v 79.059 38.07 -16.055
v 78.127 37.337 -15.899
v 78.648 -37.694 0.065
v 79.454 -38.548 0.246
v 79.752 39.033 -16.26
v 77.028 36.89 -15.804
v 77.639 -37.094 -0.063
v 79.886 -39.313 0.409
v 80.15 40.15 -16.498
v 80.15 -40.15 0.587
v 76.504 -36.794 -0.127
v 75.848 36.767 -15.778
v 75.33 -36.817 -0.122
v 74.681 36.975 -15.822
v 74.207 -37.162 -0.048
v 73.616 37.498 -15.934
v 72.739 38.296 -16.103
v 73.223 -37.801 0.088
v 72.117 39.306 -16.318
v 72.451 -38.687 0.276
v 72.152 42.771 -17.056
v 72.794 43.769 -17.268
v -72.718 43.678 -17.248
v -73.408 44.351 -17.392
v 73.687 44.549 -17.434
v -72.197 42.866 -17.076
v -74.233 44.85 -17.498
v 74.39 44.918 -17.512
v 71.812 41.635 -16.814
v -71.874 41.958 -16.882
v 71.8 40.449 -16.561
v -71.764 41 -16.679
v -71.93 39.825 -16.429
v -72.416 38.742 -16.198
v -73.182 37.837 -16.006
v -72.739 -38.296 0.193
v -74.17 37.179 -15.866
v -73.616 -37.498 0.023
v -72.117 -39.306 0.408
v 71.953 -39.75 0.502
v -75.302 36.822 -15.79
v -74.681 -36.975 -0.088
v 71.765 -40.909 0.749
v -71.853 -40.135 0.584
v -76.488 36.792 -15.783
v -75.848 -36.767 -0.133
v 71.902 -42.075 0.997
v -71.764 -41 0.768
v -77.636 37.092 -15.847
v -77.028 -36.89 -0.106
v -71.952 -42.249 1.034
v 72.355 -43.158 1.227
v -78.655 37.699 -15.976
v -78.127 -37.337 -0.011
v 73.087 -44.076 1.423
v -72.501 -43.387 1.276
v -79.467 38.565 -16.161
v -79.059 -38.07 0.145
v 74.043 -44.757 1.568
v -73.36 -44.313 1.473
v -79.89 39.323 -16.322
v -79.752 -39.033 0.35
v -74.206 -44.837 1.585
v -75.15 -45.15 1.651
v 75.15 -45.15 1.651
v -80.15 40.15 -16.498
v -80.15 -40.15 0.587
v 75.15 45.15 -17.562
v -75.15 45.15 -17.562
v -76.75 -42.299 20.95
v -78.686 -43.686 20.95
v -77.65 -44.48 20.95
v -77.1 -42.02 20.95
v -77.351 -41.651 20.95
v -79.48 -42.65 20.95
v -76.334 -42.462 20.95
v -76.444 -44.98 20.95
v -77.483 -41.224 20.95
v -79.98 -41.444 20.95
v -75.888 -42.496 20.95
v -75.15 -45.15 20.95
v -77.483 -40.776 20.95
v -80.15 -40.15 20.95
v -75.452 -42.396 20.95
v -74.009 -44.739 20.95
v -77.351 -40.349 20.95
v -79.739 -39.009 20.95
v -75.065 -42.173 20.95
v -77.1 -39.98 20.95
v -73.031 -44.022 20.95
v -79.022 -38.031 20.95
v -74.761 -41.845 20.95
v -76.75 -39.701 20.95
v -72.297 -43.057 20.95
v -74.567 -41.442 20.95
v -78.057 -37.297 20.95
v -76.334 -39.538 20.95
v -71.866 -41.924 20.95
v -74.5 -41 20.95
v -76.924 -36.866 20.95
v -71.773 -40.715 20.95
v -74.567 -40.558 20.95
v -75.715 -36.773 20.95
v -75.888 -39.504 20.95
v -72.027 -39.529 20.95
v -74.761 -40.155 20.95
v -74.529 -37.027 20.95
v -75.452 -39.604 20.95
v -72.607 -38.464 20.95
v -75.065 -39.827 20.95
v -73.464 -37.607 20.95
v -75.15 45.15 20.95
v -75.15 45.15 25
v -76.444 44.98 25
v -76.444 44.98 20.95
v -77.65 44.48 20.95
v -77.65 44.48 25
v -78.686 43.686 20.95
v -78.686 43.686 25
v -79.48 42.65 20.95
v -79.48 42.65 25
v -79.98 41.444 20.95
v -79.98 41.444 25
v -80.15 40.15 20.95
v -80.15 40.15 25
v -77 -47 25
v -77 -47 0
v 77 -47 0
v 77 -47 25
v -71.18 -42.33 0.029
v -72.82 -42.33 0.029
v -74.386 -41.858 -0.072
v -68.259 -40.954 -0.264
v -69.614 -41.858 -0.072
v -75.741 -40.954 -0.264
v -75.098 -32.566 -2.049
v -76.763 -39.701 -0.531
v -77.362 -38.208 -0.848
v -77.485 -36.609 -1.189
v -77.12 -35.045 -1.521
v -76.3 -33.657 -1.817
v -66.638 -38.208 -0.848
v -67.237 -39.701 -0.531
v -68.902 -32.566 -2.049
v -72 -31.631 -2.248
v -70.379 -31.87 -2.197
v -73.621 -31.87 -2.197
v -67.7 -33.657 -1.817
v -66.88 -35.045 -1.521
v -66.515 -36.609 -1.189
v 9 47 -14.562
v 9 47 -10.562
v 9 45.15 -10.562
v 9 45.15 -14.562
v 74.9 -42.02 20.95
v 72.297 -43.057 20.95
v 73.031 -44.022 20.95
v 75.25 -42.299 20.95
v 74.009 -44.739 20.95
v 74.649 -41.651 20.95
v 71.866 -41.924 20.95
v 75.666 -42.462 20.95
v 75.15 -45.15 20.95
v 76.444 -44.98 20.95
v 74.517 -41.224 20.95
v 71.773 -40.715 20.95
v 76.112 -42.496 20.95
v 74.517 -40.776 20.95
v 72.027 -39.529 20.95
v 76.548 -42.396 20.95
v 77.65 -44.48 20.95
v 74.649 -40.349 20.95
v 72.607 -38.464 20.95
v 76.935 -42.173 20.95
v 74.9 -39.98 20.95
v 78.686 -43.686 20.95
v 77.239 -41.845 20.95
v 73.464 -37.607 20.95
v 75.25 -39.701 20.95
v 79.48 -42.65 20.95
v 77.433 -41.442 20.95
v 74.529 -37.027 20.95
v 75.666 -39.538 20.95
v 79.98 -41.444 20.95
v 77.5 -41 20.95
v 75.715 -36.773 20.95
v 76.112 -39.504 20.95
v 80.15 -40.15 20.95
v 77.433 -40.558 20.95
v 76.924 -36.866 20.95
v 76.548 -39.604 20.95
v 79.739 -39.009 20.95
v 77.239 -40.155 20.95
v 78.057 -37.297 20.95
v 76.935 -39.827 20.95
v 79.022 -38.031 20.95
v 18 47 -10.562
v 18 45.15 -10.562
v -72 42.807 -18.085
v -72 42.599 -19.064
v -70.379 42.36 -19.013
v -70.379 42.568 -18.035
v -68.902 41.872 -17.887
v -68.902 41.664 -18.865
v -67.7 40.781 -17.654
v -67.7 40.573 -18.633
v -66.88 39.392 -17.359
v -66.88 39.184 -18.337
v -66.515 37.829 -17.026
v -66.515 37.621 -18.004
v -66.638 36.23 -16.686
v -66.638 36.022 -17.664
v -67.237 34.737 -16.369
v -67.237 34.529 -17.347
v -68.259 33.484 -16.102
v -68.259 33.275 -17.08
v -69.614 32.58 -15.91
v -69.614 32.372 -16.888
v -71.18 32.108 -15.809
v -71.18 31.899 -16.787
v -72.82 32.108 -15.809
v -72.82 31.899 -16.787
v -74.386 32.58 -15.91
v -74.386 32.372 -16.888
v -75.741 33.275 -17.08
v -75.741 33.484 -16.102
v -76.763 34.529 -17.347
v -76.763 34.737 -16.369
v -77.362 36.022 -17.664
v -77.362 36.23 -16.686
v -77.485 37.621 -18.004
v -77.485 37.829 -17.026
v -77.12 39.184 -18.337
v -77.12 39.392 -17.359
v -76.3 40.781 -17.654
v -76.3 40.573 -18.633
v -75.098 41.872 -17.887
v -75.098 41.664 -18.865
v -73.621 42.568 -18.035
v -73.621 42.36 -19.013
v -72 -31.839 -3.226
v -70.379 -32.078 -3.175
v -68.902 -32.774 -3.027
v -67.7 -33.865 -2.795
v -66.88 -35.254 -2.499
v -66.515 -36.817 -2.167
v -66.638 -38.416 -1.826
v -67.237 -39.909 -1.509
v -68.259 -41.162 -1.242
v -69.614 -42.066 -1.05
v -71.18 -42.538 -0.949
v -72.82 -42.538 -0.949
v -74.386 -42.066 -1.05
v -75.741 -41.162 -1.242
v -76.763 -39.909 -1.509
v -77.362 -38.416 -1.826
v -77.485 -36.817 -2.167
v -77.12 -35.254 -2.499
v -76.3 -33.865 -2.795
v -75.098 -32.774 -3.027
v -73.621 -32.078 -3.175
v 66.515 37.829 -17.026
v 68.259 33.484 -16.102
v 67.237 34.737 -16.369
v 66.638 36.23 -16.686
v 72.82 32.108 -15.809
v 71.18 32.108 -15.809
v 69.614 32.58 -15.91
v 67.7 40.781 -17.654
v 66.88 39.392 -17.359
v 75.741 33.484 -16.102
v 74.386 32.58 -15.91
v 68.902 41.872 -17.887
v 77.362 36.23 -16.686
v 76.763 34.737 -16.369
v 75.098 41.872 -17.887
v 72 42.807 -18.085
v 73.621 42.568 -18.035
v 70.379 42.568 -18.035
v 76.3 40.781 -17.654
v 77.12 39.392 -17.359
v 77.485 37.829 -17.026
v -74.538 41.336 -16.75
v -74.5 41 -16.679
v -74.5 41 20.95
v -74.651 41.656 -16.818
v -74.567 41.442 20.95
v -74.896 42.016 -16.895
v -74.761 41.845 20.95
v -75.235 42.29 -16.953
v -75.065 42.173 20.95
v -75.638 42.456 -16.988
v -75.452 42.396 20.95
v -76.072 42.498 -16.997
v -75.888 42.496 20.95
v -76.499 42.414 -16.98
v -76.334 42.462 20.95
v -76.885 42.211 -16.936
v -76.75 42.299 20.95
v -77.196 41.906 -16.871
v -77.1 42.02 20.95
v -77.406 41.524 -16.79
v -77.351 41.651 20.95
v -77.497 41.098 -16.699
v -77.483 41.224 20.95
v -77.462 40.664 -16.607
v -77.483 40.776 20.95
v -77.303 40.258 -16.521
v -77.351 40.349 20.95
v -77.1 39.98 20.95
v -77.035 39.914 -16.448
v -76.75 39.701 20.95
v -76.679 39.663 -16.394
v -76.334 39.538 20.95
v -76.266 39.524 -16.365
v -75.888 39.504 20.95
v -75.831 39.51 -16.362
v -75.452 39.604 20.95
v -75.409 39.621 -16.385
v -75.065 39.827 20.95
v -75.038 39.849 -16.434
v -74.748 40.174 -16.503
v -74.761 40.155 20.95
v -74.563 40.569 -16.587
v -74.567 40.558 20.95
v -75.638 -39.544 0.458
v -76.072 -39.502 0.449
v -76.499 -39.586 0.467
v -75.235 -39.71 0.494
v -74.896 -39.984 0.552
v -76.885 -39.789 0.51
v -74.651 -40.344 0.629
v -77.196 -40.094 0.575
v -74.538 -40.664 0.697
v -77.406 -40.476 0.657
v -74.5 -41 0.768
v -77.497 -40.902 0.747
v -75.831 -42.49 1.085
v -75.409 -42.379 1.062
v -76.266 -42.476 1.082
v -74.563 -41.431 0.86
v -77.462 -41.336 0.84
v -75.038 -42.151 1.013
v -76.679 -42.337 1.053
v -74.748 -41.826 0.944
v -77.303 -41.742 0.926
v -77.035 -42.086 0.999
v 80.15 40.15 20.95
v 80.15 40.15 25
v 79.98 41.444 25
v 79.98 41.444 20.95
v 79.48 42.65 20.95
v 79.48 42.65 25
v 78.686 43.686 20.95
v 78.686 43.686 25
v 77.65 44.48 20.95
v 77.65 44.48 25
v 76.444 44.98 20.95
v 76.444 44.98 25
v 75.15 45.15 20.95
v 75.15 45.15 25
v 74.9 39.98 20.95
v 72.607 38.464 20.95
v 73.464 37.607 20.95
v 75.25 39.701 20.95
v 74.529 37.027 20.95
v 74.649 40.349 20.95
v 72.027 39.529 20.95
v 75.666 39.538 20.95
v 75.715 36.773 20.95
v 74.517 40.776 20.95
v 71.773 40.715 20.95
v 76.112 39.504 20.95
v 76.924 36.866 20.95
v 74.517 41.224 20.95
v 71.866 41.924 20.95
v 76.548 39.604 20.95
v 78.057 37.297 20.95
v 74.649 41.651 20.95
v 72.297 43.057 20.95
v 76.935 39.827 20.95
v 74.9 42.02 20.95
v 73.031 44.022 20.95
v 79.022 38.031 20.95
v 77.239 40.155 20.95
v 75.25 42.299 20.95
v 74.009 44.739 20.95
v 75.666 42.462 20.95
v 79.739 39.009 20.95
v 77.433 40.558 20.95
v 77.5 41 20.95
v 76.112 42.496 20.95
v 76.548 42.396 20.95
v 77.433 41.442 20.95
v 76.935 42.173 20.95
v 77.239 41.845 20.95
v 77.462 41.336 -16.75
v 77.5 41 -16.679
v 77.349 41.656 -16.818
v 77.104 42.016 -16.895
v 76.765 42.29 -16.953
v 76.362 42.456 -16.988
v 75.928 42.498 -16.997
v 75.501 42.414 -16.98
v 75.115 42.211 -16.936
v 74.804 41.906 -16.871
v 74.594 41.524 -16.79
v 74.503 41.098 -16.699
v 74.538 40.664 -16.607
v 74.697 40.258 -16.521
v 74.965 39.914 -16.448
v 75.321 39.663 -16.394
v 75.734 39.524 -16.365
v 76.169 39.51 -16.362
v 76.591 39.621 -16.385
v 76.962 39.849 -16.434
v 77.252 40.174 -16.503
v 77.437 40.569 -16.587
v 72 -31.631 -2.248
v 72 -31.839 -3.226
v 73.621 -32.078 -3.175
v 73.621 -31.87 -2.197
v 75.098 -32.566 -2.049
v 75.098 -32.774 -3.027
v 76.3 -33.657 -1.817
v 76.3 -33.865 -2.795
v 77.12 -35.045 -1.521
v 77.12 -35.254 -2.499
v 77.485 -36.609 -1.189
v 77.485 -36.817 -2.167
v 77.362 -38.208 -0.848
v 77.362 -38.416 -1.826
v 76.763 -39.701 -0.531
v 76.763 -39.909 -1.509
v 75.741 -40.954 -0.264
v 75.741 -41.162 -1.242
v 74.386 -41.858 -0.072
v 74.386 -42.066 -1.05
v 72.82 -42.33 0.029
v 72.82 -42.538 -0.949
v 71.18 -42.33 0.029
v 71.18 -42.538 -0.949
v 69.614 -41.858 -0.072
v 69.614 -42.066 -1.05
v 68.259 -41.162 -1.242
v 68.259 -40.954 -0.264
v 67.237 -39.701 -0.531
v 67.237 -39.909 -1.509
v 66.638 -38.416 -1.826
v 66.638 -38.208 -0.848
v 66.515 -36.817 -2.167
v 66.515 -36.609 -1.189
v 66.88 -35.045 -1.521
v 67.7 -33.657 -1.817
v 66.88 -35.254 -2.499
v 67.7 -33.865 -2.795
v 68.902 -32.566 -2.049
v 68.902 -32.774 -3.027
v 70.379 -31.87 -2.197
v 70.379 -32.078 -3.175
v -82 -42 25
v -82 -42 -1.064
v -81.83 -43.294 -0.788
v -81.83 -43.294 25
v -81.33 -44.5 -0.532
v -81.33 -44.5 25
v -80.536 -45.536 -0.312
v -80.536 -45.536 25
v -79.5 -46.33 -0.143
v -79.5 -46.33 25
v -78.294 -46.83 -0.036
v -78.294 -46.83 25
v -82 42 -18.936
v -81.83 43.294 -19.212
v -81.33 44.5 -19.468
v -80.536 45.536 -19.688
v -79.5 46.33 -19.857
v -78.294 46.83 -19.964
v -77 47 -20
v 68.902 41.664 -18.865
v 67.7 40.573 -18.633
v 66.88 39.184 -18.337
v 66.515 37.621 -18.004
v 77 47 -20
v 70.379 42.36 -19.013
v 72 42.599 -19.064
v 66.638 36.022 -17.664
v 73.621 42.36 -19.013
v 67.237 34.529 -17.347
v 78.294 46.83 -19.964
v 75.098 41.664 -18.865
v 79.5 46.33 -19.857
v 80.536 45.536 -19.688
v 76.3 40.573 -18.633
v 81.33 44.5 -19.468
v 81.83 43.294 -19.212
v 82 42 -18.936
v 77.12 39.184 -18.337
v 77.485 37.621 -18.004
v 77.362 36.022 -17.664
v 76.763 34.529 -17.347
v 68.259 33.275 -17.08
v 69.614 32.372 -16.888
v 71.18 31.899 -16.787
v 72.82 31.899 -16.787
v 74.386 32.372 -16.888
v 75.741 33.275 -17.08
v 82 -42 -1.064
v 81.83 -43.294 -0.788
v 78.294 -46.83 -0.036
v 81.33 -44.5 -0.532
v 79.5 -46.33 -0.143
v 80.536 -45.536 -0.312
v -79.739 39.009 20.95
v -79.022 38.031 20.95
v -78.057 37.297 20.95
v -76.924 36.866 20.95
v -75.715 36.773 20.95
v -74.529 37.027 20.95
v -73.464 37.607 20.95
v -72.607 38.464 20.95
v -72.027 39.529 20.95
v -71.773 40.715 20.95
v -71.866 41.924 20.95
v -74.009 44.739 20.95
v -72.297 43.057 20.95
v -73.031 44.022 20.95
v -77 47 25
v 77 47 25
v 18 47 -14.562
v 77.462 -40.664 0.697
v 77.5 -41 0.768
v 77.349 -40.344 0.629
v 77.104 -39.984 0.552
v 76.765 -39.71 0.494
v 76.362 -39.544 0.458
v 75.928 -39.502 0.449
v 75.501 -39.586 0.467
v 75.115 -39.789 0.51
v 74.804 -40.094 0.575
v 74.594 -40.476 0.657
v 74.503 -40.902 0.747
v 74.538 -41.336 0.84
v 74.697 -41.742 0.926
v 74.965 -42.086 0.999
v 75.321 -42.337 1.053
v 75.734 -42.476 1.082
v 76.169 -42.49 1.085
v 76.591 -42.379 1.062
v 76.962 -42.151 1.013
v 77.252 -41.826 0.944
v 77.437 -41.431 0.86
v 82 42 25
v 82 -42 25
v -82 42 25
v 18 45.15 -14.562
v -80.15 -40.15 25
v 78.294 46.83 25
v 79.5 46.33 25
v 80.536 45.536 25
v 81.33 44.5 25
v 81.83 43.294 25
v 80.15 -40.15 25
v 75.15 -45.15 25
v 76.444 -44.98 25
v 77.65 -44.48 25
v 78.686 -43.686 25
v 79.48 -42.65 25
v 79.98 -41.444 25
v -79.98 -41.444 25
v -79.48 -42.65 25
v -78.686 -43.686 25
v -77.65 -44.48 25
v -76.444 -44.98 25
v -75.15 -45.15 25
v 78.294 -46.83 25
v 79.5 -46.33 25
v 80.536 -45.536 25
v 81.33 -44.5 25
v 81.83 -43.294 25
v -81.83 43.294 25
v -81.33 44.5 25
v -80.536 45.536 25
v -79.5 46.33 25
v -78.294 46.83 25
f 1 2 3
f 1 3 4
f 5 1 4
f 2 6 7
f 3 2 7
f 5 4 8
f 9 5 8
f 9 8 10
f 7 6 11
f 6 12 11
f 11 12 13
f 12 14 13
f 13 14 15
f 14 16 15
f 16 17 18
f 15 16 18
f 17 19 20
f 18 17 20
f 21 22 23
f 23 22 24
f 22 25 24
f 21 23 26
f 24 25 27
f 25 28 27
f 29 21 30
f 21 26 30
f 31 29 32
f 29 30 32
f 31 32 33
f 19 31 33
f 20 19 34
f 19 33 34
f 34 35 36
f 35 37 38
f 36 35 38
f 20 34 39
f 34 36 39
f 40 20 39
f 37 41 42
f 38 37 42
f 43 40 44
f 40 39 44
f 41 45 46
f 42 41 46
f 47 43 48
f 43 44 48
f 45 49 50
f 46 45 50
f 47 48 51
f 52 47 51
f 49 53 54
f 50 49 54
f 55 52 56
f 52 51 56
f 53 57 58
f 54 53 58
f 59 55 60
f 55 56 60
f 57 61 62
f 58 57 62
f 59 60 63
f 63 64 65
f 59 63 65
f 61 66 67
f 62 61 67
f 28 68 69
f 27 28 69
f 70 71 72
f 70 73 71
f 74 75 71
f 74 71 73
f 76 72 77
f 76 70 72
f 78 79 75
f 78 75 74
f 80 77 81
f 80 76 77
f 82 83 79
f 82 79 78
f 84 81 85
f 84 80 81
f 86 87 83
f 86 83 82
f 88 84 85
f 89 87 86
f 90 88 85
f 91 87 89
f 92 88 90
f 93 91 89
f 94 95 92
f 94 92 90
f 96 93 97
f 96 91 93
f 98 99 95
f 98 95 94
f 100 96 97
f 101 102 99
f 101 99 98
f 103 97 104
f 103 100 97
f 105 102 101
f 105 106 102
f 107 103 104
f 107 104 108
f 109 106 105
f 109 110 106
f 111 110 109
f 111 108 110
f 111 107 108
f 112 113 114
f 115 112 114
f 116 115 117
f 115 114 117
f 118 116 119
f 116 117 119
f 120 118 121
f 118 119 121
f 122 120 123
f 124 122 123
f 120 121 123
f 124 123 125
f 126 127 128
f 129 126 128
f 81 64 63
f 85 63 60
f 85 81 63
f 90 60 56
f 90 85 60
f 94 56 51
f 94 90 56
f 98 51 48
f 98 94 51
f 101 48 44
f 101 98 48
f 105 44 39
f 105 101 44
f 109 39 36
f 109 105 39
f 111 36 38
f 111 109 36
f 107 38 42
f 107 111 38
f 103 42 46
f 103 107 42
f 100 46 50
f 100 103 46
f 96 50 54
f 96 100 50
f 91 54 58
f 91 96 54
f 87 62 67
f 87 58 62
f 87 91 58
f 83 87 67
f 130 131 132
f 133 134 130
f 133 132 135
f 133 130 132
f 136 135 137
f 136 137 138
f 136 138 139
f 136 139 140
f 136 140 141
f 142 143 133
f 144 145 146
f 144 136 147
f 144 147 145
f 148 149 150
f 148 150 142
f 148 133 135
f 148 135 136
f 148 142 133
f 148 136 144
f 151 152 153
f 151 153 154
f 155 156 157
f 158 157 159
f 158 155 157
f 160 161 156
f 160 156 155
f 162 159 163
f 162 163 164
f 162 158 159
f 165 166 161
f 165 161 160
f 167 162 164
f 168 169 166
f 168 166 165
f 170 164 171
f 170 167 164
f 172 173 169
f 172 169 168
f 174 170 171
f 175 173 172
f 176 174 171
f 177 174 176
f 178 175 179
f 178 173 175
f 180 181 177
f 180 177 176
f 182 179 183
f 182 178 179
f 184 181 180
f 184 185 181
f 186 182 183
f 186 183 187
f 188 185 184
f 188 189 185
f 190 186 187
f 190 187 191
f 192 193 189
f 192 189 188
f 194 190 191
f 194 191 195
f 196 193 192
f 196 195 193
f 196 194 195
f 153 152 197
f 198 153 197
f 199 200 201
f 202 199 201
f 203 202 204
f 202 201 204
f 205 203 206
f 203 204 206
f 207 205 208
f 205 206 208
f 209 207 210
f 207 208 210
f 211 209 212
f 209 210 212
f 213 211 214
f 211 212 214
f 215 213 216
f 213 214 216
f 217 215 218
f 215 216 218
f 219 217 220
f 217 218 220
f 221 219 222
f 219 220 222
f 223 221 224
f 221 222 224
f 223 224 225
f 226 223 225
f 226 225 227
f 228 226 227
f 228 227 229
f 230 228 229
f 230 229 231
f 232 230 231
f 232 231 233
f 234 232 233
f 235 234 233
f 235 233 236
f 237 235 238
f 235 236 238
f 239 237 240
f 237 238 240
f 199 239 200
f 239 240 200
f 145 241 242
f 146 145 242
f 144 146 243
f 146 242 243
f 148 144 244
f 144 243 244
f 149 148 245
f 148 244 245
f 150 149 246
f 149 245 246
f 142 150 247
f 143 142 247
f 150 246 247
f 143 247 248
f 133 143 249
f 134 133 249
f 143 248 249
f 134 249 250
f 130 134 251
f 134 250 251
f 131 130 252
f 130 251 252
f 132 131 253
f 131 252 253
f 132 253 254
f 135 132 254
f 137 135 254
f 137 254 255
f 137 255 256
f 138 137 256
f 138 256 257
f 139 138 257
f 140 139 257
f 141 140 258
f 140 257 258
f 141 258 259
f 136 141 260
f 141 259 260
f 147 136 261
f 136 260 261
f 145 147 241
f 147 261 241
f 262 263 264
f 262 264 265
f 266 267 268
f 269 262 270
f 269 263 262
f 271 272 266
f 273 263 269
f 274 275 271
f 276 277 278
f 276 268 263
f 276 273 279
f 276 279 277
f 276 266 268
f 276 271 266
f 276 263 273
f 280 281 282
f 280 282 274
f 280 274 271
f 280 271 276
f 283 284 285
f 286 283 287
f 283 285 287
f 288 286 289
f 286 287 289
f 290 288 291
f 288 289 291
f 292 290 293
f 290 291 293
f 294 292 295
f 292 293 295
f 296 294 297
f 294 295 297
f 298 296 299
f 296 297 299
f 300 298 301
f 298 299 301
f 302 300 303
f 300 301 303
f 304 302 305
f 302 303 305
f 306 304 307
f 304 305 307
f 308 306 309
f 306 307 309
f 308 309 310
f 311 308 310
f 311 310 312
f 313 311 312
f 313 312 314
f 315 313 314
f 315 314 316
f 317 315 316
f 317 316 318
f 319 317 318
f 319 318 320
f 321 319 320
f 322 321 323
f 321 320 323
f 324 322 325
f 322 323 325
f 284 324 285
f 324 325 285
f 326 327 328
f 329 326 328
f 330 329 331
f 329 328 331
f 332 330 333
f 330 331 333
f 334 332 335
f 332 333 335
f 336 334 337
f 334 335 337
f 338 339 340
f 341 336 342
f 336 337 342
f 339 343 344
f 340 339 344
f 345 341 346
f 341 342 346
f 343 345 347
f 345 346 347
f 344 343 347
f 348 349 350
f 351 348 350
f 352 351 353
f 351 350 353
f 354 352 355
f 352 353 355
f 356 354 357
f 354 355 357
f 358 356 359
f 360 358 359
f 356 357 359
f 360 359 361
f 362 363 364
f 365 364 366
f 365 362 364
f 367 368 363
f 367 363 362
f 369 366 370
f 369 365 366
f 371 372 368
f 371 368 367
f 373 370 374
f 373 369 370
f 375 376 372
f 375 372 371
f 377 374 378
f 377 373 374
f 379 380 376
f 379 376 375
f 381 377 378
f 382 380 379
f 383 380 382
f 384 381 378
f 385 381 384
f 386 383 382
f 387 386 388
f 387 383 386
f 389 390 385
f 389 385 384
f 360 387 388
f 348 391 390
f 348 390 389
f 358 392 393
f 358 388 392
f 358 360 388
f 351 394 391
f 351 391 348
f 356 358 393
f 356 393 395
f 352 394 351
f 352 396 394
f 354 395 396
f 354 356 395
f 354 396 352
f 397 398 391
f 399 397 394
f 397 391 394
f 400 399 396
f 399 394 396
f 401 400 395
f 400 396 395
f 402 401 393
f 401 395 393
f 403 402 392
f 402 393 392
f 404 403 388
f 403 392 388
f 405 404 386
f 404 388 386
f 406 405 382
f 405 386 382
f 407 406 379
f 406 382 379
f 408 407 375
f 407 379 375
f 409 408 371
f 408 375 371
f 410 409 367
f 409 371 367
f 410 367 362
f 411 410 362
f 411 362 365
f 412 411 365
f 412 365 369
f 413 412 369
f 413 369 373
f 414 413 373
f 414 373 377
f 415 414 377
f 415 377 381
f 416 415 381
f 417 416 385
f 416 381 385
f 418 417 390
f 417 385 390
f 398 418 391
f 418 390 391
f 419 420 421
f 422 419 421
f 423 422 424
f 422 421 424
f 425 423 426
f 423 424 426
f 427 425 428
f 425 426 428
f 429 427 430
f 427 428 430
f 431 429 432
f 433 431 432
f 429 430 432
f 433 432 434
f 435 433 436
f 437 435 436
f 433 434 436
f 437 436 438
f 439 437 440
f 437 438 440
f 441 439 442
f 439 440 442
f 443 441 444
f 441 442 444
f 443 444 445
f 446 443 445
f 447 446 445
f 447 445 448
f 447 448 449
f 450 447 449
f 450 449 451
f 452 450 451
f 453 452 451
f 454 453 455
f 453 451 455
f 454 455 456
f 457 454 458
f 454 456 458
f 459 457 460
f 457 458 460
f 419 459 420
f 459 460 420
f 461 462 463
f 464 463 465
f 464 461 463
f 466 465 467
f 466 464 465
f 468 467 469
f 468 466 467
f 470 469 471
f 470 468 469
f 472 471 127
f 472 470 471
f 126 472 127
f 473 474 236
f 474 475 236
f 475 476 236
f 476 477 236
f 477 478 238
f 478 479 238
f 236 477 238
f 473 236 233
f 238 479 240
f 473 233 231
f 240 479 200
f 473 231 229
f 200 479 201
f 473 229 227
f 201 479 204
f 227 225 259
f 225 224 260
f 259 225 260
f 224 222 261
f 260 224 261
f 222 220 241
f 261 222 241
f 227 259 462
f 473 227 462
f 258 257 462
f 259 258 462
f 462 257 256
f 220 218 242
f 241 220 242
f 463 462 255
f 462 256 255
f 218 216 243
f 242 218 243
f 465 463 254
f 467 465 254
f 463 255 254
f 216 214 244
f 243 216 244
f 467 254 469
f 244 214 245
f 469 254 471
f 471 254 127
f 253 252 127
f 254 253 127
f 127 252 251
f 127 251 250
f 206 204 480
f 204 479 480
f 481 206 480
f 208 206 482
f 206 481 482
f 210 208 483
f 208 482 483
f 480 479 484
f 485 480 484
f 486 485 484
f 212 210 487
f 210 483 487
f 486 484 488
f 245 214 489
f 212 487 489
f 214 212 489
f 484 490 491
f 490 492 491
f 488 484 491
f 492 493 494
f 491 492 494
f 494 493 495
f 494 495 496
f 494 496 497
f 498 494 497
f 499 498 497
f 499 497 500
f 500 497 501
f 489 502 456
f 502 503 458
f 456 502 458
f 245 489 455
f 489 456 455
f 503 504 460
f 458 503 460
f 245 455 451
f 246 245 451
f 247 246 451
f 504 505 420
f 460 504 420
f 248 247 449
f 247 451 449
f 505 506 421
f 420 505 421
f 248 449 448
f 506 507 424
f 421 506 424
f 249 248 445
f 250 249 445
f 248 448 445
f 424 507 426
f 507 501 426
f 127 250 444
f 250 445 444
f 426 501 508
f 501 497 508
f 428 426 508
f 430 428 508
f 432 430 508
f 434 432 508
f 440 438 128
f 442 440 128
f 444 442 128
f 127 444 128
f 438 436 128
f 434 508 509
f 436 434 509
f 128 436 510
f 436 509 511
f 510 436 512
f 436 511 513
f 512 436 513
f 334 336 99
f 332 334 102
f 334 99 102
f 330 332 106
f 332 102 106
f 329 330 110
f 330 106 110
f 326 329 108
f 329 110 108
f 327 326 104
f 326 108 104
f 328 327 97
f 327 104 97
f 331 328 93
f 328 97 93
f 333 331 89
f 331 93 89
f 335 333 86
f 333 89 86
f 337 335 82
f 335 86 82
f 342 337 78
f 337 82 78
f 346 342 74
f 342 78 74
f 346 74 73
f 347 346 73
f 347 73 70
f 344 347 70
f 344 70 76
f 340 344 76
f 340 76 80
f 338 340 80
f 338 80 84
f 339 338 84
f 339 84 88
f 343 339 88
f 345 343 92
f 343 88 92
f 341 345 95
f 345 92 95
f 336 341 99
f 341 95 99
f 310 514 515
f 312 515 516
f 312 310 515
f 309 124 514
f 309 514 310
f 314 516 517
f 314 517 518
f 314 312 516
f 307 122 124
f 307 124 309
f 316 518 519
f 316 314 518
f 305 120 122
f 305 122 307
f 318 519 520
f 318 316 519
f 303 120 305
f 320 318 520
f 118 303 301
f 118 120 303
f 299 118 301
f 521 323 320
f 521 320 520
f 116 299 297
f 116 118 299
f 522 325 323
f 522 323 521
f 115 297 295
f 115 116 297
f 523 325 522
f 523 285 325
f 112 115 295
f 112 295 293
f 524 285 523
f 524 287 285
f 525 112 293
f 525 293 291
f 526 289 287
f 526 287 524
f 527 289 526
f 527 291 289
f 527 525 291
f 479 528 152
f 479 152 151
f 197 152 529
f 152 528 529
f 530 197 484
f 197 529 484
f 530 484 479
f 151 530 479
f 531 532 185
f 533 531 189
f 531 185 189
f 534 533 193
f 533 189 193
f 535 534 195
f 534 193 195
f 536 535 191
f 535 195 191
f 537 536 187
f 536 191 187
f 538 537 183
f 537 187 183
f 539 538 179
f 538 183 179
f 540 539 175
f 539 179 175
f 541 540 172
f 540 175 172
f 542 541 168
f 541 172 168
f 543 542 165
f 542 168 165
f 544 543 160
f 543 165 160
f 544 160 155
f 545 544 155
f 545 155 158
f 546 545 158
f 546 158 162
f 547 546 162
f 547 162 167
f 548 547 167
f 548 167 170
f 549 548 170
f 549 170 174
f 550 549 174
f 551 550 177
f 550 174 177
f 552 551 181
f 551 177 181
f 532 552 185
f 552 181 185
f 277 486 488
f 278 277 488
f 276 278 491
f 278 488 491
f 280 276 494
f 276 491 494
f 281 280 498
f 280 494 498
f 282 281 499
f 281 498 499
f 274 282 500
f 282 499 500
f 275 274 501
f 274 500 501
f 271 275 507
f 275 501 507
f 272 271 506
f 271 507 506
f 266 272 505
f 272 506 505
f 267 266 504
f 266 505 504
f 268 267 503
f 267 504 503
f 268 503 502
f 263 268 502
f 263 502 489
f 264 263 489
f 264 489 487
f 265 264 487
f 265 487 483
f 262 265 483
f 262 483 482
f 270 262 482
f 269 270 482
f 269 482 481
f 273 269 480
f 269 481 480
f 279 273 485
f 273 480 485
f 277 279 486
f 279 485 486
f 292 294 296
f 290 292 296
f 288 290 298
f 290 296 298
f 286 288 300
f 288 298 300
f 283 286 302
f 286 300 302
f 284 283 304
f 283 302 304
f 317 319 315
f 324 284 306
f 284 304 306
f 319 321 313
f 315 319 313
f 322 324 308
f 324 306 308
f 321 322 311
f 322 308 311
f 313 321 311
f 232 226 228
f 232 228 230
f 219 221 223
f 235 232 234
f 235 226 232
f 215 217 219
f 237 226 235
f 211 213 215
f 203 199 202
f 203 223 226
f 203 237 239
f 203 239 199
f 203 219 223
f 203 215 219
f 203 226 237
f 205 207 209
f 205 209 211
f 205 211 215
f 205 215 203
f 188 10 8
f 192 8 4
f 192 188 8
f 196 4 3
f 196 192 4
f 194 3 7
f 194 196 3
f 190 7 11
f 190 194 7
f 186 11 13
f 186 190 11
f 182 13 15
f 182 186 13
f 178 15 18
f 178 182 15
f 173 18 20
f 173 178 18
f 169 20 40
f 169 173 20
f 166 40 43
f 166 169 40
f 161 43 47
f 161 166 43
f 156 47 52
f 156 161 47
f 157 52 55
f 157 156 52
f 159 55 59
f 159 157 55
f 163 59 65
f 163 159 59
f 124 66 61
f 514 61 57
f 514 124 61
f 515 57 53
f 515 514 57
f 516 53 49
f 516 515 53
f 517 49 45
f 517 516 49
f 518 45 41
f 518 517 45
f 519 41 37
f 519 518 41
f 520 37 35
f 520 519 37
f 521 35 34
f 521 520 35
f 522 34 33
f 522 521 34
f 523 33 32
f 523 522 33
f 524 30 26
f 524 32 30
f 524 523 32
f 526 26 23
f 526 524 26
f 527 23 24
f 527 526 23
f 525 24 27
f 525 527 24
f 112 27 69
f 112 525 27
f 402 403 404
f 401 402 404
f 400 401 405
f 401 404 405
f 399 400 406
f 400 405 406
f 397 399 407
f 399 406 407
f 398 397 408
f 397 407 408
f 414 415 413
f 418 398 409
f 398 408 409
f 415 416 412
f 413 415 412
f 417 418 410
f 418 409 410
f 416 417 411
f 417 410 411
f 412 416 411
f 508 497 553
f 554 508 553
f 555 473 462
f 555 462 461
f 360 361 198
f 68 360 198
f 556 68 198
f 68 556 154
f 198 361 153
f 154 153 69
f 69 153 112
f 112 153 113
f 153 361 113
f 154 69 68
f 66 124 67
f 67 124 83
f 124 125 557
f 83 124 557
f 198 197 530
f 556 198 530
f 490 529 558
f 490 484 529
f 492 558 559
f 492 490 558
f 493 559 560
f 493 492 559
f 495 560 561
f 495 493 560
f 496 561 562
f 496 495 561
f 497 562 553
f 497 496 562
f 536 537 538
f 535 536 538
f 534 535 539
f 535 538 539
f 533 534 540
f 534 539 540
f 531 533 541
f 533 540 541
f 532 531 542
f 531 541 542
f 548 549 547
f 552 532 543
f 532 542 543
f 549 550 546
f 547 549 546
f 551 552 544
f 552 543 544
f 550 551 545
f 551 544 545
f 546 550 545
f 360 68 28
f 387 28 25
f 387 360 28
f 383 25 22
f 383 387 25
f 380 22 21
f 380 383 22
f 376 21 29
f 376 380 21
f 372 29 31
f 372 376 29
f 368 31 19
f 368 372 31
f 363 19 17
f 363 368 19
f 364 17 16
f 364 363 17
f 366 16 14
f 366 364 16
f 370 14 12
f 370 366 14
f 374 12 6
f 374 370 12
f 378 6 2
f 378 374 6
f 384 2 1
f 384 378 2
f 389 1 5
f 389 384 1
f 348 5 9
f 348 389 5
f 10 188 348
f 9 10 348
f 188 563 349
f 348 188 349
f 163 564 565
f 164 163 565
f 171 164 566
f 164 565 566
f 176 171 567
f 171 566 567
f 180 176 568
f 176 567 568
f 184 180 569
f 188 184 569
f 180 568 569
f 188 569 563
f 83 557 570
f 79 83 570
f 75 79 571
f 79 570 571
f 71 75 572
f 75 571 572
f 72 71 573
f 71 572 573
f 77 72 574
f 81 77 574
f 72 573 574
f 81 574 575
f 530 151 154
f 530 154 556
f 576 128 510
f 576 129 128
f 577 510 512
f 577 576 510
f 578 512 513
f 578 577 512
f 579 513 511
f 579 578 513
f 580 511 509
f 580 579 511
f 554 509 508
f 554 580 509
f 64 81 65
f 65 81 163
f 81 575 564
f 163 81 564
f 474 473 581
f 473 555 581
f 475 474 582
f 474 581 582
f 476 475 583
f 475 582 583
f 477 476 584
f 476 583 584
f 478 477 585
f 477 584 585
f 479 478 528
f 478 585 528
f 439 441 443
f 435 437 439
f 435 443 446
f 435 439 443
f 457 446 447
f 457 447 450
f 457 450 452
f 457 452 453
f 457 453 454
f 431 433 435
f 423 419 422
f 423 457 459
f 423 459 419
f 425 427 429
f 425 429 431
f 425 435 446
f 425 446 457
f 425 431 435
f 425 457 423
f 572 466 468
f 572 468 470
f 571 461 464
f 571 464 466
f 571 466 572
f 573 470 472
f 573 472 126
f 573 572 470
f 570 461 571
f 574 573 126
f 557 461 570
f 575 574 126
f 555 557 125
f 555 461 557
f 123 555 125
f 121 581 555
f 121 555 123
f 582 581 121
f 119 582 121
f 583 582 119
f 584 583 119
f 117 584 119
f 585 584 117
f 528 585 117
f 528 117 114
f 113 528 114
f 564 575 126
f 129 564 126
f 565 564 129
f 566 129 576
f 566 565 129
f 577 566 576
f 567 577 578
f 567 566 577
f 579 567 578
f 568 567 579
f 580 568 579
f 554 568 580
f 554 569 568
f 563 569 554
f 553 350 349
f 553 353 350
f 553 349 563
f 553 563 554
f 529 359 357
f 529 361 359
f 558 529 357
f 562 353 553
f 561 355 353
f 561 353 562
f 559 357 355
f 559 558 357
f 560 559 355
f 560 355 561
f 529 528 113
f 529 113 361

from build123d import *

# Parameters (mm, degrees)
SKIZZE1_W                       = 164
SKIZZE1_H                       = 94
AUFSATZ_LINEAR_AUSTRAGEN1_DEPTH = 25
AUFSATZ_LINEAR_AUSTRAGEN2_DEPTH = 164
SCHNITT_LINEAR_AUSTRAGEN1_REACH = 106.68
AUFSATZ_LINEAR_AUSTRAGEN3_REACH = 106.68
SKIZZE4_R                       = 4.236153916
SKIZZE4_R_2                     = 1.5
SCHNITT_LINEAR_AUSTRAGEN2_DEPTH = 4.05
VERRUNDUNG1_R                   = 5
SKIZZE7_W                       = 9
SKIZZE7_H                       = 4
SCHNITT_LINEAR_AUSTRAGEN4_DEPTH = 4.05
SKIZZE8_R                       = 5.5
SCHNITT_LINEAR_AUSTRAGEN5_DEPTH = 1


with BuildPart() as part:
    # Skizze1 → Aufsatz-Linear austragen1 (new body)
    with BuildSketch(Plane.XY):
        Rectangle(SKIZZE1_W, SKIZZE1_H)
    extrude(amount=AUFSATZ_LINEAR_AUSTRAGEN1_DEPTH)

    # Skizze2 → Aufsatz-Linear austragen2 (add)
    with BuildSketch(Plane(origin=(82, 0, 0), x_dir=(0, 0, -1), z_dir=(1, 0, 0))):
        Polygon((0, -47), (0, 47), (20, 47), align=None)
    extrude(amount=-AUFSATZ_LINEAR_AUSTRAGEN2_DEPTH)

    # Schnitt-Linear austragen1: up to this plane
    schnitt_linear_austragen1_end = Plane(origin=(-82, 47.416215289, -18.043788142), z_dir=(0, -0.20810764446485866, -0.9781059289848355))
    # Skizze3 → Schnitt-Linear austragen1 (cut, up to the surface)
    with BuildSketch(Plane.XY.offset(25), mode=Mode.PRIVATE) as schnitt_linear_austragen1_sk1:
        with BuildLine():
            Line((-75.15, -45.15), (75.15, -45.15))
            ThreePointArc((75.15, -45.15), (78.685533906, -43.685533906), (80.15, -40.15))
            Line((80.15, -40.15), (80.15, 40.15))
            ThreePointArc((80.15, 40.15), (78.685533906, 43.685533906), (75.15, 45.15))
            Line((75.15, 45.15), (-75.15, 45.15))
            ThreePointArc((-75.15, 45.15), (-78.685533906, 43.685533906), (-80.15, 40.15))
            Line((-80.15, 40.15), (-80.15, -40.15))
            ThreePointArc((-80.15, -40.15), (-78.685533906, -43.685533906), (-75.15, -45.15))
        make_face()
    schnitt_linear_austragen1_tool1 = split(extrude(schnitt_linear_austragen1_sk1.sketch, amount=-SCHNITT_LINEAR_AUSTRAGEN1_REACH, mode=Mode.PRIVATE), bisect_by=schnitt_linear_austragen1_end, keep=Keep.BOTH, mode=Mode.PRIVATE)
    add(schnitt_linear_austragen1_tool1.solids().sort_by_distance((0, 0, 25))[0], mode=Mode.SUBTRACT)

    # Aufsatz-Linear austragen3: up to this plane
    aufsatz_linear_austragen3_end = Plane(origin=(-82, 47.416215289, -18.043788142), z_dir=(0, -0.20810764446485866, -0.9781059289848355))
    # Skizze4 → Aufsatz-Linear austragen3 (add, up to the surface)
    with BuildSketch(Plane.XY.offset(25), mode=Mode.PRIVATE) as aufsatz_linear_austragen3_sk1:
        with Locations((-76, 41)):
            Circle(SKIZZE4_R)
        with Locations((-76, 41)):
            Circle(SKIZZE4_R_2, mode=Mode.SUBTRACT)
    aufsatz_linear_austragen3_tool1 = split(extrude(aufsatz_linear_austragen3_sk1.sketch, amount=-AUFSATZ_LINEAR_AUSTRAGEN3_REACH, mode=Mode.PRIVATE), bisect_by=aufsatz_linear_austragen3_end, keep=Keep.BOTH, mode=Mode.PRIVATE)
    add(aufsatz_linear_austragen3_tool1.solids().sort_by_distance((-80.116337, 41, 25))[0])
    # Skizze4 → Aufsatz-Linear austragen3 (add, up to the surface)
    with BuildSketch(Plane.XY.offset(25), mode=Mode.PRIVATE) as aufsatz_linear_austragen3_sk2:
        with Locations((-76, -41)):
            Circle(SKIZZE4_R)
        with Locations((-76, -41)):
            Circle(SKIZZE4_R_2, mode=Mode.SUBTRACT)
    aufsatz_linear_austragen3_tool2 = split(extrude(aufsatz_linear_austragen3_sk2.sketch, amount=-AUFSATZ_LINEAR_AUSTRAGEN3_REACH, mode=Mode.PRIVATE), bisect_by=aufsatz_linear_austragen3_end, keep=Keep.BOTH, mode=Mode.PRIVATE)
    add(aufsatz_linear_austragen3_tool2.solids().sort_by_distance((-80.116337, -41, 25))[0])
    # Skizze4 → Aufsatz-Linear austragen3 (add, up to the surface)
    with BuildSketch(Plane.XY.offset(25), mode=Mode.PRIVATE) as aufsatz_linear_austragen3_sk3:
        with Locations((76, -41)):
            Circle(SKIZZE4_R)
        with Locations((76, -41)):
            Circle(SKIZZE4_R_2, mode=Mode.SUBTRACT)
    aufsatz_linear_austragen3_tool3 = split(extrude(aufsatz_linear_austragen3_sk3.sketch, amount=-AUFSATZ_LINEAR_AUSTRAGEN3_REACH, mode=Mode.PRIVATE), bisect_by=aufsatz_linear_austragen3_end, keep=Keep.BOTH, mode=Mode.PRIVATE)
    add(aufsatz_linear_austragen3_tool3.solids().sort_by_distance((71.883663, -41, 25))[0])
    # Skizze4 → Aufsatz-Linear austragen3 (add, up to the surface)
    with BuildSketch(Plane.XY.offset(25), mode=Mode.PRIVATE) as aufsatz_linear_austragen3_sk4:
        with Locations((76, 41)):
            Circle(SKIZZE4_R)
        with Locations((76, 41)):
            Circle(SKIZZE4_R_2, mode=Mode.SUBTRACT)
    aufsatz_linear_austragen3_tool4 = split(extrude(aufsatz_linear_austragen3_sk4.sketch, amount=-AUFSATZ_LINEAR_AUSTRAGEN3_REACH, mode=Mode.PRIVATE), bisect_by=aufsatz_linear_austragen3_end, keep=Keep.BOTH, mode=Mode.PRIVATE)
    add(aufsatz_linear_austragen3_tool4.solids().sort_by_distance((71.883663, 41, 25))[0])

    # Skizze6 → Schnitt-Linear austragen2 (cut)
    with BuildSketch(Plane.XY.offset(25)):
        with BuildLine():
            Line((-75.15, -45.15), (75.15, -45.15))
            ThreePointArc((75.15, -45.15), (78.685533906, -43.685533906), (80.15, -40.15))
            Line((80.15, -40.15), (80.15, 40.15))
            ThreePointArc((80.15, 40.15), (78.685533906, 43.685533906), (75.15, 45.15))
            Line((75.15, 45.15), (-75.15, 45.15))
            ThreePointArc((-75.15, 45.15), (-78.685533906, 43.685533906), (-80.15, 40.15))
            Line((-80.15, 40.15), (-80.15, -40.15))
            ThreePointArc((-80.15, -40.15), (-78.685533906, -43.685533906), (-75.15, -45.15))
        make_face()
    extrude(amount=-SCHNITT_LINEAR_AUSTRAGEN2_DEPTH, mode=Mode.SUBTRACT)

    # Verrundung1
    verrundung1_edges = [part.edges().sort_by_distance(p)[0] for p in [
        (82, -47, 12.5),
        (-82, -47, 12.5),
        (-82, 47, 2.5),
        (82, 47, 2.5),
    ]]
    fillet(verrundung1_edges, radius=VERRUNDUNG1_R)

    # Skizze7 → Schnitt-Linear austragen4 (cut)
    with BuildSketch(Plane(origin=(0, 47, 0), x_dir=(1, 0, 0), z_dir=(0, 1, 0))):
        with Locations((13.5, 12.561614676)):
            Rectangle(SKIZZE7_W, SKIZZE7_H)
    extrude(amount=-SCHNITT_LINEAR_AUSTRAGEN4_DEPTH, mode=Mode.SUBTRACT)

    # Skizze8 → Schnitt-Linear austragen5 (cut)
    with BuildSketch(Plane(origin=(0, -2.035513209, -9.566912083), x_dir=(-1, 0, 0), z_dir=(0, -0.20810764446485866, -0.9781059289848355))):
        with Locations(Location((-72, 40.133131552, 0), (0, 0, 90))):
            Circle(SKIZZE8_R)
        with Locations(Location((72, 40.133131552, 0), (0, 0, 90))):
            Circle(SKIZZE8_R)
        with Locations(Location((72, -35.970978662, 0), (0, 0, 90))):
            Circle(SKIZZE8_R)
        with Locations(Location((-72, -35.970978662, 0), (0, 0, 90))):
            Circle(SKIZZE8_R)
    extrude(amount=-SCHNITT_LINEAR_AUSTRAGEN5_DEPTH, mode=Mode.SUBTRACT)


solid = part.part
